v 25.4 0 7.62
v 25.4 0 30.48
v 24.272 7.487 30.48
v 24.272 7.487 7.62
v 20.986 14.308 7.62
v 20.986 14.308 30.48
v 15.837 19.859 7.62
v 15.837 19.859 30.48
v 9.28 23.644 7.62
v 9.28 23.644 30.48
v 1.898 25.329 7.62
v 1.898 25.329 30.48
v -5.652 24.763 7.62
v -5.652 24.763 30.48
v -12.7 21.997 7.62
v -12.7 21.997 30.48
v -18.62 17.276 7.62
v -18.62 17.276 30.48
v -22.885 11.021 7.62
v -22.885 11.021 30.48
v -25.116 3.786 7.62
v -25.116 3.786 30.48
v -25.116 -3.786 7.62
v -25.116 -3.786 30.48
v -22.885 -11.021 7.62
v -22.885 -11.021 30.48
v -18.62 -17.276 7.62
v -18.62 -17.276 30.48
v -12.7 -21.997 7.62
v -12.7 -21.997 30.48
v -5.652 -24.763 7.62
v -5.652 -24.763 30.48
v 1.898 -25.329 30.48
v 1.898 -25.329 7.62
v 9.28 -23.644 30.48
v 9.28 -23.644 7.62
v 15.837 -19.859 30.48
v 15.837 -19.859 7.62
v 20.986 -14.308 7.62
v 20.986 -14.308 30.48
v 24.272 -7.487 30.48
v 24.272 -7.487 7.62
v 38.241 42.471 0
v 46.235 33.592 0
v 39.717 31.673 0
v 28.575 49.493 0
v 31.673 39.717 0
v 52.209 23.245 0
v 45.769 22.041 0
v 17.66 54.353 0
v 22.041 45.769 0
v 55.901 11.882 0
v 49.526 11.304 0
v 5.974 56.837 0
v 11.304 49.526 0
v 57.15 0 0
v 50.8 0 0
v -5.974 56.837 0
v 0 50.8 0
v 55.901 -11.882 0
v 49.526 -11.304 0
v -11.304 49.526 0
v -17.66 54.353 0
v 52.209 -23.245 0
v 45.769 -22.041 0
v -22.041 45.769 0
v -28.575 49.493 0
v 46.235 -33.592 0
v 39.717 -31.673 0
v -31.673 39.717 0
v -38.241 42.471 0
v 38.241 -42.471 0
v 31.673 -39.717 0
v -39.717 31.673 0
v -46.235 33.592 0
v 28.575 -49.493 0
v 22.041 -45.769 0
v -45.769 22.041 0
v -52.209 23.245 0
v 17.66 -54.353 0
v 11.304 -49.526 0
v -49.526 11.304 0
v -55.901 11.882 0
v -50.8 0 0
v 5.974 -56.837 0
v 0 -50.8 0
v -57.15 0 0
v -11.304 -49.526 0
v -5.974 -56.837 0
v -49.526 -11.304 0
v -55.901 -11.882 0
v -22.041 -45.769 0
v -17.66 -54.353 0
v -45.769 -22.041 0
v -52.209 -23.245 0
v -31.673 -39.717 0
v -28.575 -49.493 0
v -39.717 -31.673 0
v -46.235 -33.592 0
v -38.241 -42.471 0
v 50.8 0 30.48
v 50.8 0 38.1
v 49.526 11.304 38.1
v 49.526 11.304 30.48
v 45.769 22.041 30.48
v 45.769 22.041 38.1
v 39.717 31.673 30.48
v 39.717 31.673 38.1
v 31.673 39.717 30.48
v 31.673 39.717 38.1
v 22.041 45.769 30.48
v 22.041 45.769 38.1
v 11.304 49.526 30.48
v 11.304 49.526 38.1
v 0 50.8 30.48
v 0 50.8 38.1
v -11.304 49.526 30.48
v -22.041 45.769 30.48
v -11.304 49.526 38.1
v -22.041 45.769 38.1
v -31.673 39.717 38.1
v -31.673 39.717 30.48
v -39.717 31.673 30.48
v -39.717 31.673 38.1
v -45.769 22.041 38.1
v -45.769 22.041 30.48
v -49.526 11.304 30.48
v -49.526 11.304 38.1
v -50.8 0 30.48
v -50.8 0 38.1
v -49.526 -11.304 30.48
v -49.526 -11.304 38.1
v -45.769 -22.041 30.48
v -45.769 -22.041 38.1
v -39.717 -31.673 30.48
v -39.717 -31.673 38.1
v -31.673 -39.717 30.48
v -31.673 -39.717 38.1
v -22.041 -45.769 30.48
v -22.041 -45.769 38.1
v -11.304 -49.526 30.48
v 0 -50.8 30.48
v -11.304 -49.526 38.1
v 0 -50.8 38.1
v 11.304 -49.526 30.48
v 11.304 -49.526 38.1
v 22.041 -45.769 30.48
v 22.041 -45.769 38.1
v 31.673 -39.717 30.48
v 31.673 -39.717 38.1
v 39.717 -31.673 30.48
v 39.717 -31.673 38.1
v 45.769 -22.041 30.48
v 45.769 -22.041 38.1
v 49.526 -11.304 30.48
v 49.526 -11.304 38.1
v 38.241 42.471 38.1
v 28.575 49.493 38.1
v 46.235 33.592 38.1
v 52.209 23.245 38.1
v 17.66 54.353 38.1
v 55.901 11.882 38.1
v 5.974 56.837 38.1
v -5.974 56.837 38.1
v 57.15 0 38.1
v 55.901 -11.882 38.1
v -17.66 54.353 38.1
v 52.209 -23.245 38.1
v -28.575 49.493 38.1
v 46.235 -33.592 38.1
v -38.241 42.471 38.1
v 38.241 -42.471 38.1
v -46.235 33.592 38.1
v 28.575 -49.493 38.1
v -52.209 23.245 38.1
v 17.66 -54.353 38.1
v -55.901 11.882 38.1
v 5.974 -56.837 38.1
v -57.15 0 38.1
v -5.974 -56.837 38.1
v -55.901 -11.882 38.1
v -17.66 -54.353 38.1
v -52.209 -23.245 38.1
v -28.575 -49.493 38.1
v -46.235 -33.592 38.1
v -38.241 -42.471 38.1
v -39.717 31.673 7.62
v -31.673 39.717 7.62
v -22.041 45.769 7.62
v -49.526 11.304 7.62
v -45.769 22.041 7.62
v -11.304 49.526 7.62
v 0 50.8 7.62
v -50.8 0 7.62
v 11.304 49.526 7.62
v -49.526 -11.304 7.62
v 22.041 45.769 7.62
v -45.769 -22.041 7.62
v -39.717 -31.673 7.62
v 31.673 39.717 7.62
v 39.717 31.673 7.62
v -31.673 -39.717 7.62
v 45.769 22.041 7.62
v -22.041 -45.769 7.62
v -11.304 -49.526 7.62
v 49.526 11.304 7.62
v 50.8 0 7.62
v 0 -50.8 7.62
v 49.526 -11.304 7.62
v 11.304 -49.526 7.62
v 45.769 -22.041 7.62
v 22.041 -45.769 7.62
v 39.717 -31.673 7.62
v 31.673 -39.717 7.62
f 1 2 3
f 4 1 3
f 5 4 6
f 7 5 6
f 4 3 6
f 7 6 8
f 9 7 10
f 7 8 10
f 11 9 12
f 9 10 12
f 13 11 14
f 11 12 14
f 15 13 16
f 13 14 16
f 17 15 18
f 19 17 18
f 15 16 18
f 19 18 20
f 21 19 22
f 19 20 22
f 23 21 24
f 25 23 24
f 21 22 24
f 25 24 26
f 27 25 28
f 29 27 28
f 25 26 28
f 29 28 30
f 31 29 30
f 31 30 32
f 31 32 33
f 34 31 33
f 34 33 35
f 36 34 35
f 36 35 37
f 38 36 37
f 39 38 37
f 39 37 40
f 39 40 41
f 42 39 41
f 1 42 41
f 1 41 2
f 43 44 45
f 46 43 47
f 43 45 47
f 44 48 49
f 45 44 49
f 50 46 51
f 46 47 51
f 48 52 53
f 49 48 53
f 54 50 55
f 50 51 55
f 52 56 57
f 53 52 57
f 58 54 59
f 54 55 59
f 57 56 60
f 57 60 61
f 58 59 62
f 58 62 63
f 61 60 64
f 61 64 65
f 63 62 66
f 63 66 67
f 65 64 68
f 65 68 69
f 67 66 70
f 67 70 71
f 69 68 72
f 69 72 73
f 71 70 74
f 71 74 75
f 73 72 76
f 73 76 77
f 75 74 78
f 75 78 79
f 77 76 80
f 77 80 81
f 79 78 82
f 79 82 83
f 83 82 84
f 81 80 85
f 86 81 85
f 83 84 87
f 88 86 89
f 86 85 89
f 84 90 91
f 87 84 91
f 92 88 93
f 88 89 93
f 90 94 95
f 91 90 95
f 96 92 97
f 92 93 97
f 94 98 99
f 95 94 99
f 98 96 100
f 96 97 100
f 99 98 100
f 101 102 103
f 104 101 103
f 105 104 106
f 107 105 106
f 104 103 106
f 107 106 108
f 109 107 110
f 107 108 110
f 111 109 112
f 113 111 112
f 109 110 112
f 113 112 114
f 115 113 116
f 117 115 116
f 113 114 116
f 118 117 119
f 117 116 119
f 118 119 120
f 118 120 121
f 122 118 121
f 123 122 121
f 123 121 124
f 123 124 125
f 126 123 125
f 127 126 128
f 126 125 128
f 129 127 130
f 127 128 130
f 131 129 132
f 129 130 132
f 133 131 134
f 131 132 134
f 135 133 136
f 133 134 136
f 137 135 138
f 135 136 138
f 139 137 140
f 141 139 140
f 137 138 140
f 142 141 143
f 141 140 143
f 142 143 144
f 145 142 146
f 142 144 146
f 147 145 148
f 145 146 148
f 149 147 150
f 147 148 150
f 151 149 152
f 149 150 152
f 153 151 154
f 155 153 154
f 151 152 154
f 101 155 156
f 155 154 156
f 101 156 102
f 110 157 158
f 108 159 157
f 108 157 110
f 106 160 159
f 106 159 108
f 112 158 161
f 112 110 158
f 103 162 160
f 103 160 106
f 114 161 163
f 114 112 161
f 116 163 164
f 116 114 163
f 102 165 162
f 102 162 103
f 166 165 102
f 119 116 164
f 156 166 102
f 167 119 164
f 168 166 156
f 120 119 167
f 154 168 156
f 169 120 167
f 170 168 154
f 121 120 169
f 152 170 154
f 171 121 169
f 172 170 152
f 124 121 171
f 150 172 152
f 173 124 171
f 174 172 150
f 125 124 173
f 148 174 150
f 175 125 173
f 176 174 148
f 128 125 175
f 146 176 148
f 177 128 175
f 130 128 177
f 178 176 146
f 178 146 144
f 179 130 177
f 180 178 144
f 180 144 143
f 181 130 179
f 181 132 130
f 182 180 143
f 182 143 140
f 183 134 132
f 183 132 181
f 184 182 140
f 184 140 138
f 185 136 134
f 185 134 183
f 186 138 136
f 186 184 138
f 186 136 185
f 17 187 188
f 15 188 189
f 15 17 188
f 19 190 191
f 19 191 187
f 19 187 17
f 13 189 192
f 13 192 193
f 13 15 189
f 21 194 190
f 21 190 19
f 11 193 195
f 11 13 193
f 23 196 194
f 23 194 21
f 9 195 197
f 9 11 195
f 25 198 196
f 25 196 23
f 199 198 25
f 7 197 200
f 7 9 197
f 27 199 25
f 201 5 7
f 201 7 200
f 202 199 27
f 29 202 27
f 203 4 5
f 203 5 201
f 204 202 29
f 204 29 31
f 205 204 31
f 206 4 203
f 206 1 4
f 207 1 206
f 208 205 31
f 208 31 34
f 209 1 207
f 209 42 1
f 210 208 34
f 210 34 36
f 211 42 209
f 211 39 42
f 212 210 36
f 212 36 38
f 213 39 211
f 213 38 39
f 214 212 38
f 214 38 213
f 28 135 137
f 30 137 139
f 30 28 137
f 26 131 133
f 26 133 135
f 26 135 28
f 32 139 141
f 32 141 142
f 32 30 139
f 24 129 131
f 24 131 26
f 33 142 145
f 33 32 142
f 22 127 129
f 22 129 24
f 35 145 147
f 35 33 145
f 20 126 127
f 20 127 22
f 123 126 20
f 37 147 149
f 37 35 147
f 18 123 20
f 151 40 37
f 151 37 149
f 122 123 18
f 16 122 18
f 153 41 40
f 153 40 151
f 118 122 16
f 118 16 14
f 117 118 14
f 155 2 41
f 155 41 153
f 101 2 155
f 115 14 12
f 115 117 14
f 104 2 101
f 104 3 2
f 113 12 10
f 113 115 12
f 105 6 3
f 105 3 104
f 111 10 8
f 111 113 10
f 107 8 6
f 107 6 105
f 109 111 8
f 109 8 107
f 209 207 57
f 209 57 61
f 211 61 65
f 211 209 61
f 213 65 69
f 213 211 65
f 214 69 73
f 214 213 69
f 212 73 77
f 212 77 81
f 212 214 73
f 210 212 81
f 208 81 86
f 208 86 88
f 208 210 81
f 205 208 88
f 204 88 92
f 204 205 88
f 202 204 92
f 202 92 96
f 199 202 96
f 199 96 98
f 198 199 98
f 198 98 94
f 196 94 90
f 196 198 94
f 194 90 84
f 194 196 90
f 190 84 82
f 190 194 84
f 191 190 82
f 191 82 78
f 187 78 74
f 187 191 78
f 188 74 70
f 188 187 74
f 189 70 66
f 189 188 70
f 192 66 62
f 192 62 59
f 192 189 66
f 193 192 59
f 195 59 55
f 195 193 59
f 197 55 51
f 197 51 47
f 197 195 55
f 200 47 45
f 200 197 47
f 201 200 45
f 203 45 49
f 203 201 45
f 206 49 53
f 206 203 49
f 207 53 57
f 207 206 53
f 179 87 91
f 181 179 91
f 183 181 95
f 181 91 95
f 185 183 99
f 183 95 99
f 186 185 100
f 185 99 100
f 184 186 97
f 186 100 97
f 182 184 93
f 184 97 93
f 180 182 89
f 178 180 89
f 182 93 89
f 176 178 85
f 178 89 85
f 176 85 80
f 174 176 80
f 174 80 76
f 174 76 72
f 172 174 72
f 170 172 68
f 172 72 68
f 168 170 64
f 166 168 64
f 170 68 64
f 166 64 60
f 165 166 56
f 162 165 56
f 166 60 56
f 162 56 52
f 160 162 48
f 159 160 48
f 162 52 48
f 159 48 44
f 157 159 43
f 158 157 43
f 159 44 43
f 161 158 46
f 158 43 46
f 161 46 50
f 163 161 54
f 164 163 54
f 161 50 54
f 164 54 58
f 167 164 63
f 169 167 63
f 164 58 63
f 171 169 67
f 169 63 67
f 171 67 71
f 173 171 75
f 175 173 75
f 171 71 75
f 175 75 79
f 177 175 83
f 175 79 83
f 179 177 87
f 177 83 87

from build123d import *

# Parameters (mm, degrees)
SKETCH1_R           = 57.15
BOSS_EXTRUDE1_DEPTH = 38.1
SKETCH2_R           = 25.4
CUT_EXTRUDE1_DEPTH  = 38.1
SKETCH3_R           = 50.8
CUT_EXTRUDE2_DEPTH  = 7.62
CUT_EXTRUDE3_START  = -7.62
SKETCH5_R           = 50.8
CUT_EXTRUDE3_DEPTH  = 7.62


with BuildPart() as part:
    # Sketch1 → Boss-Extrude1 (new body)
    with BuildSketch(Plane.XY):
        with Locations(Location((0, 0, 0), (0, 0, 180))):
            Circle(SKETCH1_R)
    extrude(amount=BOSS_EXTRUDE1_DEPTH)

    # Sketch2 → Cut-Extrude1 (cut)
    with BuildSketch(Plane.XY.offset(38.1)):
        Circle(SKETCH2_R)
    extrude(amount=-CUT_EXTRUDE1_DEPTH, mode=Mode.SUBTRACT)

    # Sketch3 → Cut-Extrude2 (cut)
    with BuildSketch(Plane.XY.offset(38.1)):
        Circle(SKETCH3_R)
    extrude(amount=-CUT_EXTRUDE2_DEPTH, mode=Mode.SUBTRACT)

    # Sketch5 → Cut-Extrude3 (cut)
    with BuildSketch(Plane(origin=(0, 0, 0), x_dir=(-1, 0, 0), z_dir=(0, 0, -1)).offset(CUT_EXTRUDE3_START)):
        with Locations(Location((0, 0, 0), (0, 0, 180))):
            Circle(SKETCH5_R)
    extrude(amount=CUT_EXTRUDE3_DEPTH, mode=Mode.SUBTRACT)


solid = part.part
